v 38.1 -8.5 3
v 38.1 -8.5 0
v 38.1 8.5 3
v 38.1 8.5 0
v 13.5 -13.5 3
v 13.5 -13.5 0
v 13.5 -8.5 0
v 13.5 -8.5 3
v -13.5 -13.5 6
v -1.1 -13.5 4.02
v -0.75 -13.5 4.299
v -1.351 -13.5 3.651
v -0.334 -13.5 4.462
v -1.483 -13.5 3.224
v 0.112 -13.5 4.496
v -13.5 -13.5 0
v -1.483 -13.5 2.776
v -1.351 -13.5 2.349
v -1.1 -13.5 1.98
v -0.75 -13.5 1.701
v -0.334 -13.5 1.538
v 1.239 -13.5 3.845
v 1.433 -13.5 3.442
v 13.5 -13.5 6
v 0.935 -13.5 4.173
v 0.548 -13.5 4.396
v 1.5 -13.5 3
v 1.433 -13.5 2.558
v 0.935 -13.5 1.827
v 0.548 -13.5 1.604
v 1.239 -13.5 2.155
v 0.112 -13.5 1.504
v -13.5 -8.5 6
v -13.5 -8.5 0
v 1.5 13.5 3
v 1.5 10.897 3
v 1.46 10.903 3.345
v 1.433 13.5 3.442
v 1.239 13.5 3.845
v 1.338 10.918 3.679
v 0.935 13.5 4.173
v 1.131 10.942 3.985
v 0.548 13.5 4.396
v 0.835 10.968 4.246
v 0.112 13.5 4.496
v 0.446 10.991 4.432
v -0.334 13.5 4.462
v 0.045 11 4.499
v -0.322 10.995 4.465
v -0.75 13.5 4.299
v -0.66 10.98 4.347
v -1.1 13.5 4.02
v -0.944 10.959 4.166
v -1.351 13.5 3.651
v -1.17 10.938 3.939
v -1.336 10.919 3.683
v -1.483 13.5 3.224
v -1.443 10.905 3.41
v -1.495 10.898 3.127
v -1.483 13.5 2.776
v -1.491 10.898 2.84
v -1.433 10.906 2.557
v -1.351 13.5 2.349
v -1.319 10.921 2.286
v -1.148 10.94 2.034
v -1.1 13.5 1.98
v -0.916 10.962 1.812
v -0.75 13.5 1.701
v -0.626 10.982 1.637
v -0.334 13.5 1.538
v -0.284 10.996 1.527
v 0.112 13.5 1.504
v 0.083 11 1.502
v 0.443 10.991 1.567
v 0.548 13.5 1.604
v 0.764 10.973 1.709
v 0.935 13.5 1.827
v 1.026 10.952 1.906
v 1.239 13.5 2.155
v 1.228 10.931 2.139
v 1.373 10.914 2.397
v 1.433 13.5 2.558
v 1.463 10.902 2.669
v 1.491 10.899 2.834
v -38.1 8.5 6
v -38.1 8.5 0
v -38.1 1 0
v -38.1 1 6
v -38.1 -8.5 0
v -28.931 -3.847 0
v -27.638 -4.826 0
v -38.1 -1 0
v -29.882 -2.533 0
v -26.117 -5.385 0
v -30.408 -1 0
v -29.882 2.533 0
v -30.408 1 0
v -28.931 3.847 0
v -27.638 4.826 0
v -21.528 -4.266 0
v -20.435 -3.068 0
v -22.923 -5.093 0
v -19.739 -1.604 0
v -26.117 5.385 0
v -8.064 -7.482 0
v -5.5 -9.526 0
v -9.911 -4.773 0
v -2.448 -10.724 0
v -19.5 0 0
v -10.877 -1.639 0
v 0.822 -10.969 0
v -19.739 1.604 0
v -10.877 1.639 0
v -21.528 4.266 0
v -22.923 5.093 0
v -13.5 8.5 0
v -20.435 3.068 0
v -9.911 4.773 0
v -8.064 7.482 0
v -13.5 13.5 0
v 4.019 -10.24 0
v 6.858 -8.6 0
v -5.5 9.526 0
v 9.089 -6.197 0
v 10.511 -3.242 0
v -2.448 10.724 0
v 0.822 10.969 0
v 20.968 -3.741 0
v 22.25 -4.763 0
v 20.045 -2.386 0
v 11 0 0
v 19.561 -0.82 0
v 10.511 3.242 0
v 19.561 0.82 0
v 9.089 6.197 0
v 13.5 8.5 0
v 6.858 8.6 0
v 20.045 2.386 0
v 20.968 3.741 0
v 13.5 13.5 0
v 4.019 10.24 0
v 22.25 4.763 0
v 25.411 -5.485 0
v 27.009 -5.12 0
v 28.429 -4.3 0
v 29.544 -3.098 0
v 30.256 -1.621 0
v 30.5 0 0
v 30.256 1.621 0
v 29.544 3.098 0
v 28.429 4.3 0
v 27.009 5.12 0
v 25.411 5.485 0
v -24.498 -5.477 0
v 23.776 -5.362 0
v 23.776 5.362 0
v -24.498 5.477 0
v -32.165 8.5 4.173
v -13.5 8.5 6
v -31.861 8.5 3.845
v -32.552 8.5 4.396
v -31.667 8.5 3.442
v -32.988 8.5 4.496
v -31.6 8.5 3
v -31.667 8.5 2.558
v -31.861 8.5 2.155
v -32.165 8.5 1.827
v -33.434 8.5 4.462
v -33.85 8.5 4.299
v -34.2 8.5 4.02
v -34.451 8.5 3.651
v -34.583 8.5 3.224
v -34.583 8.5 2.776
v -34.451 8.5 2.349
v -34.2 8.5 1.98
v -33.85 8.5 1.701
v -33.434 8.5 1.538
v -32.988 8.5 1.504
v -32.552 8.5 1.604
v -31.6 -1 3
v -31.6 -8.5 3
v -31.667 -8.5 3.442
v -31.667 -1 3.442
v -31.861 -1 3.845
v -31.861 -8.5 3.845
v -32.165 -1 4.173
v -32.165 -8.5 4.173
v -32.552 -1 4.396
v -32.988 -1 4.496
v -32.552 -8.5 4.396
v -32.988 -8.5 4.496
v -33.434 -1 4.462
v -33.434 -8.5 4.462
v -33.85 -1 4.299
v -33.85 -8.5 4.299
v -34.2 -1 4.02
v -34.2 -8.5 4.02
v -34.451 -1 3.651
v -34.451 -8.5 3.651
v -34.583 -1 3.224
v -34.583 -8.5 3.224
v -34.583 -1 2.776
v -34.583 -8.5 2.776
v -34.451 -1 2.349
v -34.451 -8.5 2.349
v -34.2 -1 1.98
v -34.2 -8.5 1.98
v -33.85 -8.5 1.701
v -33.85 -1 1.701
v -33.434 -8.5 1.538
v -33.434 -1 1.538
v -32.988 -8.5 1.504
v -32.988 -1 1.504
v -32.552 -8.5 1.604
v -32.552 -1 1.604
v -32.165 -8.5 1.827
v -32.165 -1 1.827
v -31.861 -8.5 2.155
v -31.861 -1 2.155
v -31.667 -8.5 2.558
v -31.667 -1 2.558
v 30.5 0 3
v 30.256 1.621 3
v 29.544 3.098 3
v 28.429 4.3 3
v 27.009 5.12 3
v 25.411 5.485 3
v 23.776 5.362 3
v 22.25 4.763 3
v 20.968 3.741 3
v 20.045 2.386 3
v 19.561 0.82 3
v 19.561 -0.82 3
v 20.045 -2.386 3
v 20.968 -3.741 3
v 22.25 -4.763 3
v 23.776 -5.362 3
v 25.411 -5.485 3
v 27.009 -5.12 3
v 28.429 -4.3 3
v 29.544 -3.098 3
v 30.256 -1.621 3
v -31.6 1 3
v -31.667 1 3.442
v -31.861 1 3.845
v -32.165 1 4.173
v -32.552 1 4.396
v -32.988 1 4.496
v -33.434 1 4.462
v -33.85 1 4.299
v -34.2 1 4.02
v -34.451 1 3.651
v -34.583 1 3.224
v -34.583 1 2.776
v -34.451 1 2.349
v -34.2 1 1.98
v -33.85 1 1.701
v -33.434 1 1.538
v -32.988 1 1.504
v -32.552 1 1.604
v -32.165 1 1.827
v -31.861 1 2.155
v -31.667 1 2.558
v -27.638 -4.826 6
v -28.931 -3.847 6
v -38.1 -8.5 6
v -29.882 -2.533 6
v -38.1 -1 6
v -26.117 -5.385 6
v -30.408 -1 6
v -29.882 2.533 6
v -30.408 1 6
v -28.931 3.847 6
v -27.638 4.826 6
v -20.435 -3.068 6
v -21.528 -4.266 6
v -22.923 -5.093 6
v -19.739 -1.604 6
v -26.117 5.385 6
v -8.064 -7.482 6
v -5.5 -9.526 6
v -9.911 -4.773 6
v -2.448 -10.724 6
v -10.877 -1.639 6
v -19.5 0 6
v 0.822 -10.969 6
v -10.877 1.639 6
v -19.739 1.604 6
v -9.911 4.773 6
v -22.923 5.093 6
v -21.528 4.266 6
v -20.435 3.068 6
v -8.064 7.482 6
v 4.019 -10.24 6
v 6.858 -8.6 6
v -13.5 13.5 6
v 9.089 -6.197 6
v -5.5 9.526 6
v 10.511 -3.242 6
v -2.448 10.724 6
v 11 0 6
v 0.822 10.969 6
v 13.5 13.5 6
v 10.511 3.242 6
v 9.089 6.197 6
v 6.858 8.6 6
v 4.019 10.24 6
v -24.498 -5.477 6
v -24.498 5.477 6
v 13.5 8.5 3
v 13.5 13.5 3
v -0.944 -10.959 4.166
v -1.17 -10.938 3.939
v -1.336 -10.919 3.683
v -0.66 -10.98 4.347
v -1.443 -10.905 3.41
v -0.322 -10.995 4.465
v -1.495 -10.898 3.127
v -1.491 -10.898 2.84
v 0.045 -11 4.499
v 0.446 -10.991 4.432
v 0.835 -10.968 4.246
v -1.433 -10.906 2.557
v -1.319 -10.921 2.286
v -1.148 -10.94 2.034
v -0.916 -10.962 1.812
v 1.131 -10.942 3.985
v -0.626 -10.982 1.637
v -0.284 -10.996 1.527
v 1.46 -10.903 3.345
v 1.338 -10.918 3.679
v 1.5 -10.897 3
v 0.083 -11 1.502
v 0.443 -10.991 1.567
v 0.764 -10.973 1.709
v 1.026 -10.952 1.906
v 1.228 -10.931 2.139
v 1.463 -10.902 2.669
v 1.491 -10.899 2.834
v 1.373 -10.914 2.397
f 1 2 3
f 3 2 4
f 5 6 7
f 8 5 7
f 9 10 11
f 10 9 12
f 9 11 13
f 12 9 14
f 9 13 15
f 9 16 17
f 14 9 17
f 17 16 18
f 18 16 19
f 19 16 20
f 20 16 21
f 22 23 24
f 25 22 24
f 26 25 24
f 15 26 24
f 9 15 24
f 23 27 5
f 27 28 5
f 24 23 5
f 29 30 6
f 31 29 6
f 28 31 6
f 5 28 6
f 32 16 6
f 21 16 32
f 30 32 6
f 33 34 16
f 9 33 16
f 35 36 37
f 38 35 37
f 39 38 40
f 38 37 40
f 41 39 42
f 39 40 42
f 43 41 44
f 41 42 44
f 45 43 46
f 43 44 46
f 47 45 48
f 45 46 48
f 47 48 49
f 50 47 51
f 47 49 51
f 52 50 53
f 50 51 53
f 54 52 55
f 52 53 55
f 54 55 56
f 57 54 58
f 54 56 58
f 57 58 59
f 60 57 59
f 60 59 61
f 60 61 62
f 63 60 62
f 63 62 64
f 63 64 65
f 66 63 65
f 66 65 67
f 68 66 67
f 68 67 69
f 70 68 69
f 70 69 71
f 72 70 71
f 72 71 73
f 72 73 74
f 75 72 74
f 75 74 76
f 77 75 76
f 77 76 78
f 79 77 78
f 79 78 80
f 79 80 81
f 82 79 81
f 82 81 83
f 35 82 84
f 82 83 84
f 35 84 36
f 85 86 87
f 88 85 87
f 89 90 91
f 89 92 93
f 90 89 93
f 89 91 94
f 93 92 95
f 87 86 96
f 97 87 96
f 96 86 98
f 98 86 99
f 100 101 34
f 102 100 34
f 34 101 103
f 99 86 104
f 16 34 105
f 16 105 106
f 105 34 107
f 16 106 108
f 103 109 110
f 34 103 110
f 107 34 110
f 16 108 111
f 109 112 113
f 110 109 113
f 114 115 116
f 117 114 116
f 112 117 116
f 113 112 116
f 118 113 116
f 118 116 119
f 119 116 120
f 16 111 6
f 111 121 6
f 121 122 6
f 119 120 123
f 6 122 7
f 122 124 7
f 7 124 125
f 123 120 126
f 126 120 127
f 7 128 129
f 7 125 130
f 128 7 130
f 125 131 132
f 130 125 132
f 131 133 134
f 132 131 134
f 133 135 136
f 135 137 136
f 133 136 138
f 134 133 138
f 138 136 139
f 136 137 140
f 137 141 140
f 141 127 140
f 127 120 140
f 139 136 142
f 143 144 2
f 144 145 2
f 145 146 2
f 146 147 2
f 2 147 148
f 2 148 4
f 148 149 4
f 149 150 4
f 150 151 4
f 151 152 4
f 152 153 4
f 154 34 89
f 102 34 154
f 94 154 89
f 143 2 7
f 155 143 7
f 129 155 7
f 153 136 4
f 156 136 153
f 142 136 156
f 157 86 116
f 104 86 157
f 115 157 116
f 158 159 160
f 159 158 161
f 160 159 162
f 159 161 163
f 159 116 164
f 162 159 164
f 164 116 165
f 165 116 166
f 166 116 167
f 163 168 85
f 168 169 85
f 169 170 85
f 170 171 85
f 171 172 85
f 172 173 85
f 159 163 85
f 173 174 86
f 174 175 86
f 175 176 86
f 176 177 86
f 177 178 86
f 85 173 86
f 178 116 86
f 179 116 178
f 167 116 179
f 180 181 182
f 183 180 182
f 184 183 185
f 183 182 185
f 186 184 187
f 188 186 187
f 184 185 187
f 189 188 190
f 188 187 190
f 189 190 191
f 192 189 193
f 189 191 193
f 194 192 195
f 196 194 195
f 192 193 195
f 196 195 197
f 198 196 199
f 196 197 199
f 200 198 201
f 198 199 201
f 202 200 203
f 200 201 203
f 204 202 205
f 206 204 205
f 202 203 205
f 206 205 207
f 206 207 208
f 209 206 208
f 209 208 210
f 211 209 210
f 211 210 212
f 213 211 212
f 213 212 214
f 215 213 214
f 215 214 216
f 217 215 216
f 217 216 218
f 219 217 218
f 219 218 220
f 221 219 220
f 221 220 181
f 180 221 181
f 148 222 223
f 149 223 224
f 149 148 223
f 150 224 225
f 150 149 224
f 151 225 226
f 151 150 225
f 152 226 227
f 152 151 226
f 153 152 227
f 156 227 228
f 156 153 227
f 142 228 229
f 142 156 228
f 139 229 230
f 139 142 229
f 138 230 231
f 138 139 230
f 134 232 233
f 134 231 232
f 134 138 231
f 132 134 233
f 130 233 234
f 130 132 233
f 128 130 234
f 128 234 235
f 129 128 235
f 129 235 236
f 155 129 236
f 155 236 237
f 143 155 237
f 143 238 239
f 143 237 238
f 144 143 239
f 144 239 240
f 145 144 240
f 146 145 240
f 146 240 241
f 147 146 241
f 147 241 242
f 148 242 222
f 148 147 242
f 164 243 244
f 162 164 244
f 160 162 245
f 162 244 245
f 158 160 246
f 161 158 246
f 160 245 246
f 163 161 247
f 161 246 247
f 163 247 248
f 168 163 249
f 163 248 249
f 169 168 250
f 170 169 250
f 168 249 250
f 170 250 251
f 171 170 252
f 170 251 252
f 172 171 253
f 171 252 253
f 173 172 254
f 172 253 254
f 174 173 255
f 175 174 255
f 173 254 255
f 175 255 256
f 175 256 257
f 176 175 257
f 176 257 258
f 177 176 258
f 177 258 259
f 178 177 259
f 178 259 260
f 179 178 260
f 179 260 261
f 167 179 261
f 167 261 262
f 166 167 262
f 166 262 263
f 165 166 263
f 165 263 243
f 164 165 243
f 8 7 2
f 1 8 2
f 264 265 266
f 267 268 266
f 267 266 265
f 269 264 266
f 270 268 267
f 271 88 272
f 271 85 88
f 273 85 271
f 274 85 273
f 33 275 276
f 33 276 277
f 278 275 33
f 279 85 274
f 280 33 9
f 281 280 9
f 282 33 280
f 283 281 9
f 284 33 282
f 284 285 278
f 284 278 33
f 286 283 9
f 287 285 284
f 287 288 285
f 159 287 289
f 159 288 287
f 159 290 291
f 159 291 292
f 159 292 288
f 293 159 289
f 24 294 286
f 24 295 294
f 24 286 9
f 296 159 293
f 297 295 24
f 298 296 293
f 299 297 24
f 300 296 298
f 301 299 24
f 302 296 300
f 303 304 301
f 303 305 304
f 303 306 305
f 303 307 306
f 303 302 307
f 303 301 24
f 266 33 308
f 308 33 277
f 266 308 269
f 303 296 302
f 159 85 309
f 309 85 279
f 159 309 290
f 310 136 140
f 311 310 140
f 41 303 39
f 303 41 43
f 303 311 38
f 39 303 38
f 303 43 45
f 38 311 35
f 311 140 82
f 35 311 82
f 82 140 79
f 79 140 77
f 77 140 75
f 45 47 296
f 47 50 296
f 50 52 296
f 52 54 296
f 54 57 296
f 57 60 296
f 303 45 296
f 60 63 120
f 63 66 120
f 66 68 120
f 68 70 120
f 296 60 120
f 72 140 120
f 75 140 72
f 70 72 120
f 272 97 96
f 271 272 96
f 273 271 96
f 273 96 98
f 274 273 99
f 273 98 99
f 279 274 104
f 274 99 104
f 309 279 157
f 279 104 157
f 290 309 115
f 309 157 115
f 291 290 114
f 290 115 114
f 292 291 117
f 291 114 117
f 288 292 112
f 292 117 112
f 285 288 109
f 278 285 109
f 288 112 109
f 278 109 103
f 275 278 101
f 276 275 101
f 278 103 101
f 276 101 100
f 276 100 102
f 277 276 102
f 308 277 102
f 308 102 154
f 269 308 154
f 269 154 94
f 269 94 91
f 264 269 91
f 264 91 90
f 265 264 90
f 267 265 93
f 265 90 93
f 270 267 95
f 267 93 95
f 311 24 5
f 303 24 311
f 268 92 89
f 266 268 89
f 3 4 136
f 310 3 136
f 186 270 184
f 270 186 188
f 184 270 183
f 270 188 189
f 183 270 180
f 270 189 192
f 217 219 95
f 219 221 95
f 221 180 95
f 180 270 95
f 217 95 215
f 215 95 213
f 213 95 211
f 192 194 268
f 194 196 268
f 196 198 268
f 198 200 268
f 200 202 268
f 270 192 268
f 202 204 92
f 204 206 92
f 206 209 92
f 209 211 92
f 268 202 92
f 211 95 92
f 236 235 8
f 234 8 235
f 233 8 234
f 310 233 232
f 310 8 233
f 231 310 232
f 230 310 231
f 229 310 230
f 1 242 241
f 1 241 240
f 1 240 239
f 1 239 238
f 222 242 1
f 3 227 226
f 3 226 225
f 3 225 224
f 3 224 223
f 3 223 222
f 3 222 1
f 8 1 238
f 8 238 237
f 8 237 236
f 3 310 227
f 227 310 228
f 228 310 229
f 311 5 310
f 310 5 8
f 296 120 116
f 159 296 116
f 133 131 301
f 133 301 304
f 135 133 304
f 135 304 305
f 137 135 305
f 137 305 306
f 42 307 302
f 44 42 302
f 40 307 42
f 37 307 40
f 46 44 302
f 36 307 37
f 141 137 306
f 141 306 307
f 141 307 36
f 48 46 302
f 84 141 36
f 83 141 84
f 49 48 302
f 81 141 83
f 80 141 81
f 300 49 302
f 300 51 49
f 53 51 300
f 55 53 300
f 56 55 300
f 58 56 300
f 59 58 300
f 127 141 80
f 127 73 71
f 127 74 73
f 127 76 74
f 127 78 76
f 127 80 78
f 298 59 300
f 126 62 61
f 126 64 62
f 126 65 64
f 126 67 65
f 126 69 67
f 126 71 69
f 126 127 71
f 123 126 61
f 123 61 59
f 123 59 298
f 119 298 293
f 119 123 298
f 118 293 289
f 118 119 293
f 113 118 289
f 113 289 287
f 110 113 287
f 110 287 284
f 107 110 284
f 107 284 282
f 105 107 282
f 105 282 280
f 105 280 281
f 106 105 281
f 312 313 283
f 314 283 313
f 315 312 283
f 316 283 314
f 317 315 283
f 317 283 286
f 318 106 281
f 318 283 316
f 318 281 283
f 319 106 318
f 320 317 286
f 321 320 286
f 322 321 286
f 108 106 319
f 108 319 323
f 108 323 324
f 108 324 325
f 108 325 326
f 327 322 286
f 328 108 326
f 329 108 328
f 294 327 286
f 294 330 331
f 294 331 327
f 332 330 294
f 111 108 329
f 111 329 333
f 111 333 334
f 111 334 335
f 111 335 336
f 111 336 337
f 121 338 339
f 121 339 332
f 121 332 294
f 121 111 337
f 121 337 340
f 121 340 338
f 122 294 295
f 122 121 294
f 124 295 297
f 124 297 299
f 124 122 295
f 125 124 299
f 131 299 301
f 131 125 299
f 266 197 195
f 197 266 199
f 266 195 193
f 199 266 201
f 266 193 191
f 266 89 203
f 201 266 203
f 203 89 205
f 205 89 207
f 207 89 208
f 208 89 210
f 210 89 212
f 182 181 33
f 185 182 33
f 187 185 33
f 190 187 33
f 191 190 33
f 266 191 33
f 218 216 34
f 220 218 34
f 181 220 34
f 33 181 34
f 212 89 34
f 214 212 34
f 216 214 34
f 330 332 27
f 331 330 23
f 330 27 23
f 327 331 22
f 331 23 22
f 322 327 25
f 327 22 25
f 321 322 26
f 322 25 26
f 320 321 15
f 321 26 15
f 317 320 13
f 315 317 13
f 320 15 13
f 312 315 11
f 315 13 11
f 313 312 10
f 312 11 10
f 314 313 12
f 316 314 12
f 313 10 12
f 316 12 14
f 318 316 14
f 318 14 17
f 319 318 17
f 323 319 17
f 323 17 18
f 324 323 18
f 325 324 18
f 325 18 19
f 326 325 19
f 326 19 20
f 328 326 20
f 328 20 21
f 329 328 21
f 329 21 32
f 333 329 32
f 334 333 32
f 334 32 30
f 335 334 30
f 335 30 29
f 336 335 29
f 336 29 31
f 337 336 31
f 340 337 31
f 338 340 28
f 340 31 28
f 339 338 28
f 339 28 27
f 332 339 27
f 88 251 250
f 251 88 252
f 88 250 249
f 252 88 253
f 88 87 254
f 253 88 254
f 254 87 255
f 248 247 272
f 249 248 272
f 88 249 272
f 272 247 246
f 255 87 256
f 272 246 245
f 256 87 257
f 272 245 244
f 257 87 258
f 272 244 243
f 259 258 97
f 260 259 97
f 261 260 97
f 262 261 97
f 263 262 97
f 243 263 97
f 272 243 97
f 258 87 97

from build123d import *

# Parameters (mm, degrees)
F0_R     = 11
F0_R_2   = 5.5
F1_DEPTH = 6
F2_R     = 1.5
F3_DEPTH = 50.8
F4_W     = 54.249955
F4_H     = 32.60367
F5_DEPTH = 3


with BuildPart() as f1:
    # F0 (on Top) → F1 (new body)
    with BuildSketch(Plane.XY):
        with BuildLine():
            ThreePointArc((-30.408327, 1), (-19.5, 0), (-30.408327, -1))
            Line((-30.408327, -1), (-38.1, -1))
            Line((-38.1, -1), (-38.1, -8.5))
            Line((-38.1, -8.5), (-13.5, -8.5))
            Line((-13.5, -8.5), (-13.5, -13.5))
            Line((-13.5, -13.5), (13.5, -13.5))
            Line((13.5, -13.5), (13.5, -8.5))
            Line((13.5, -8.5), (38.1, -8.5))
            Line((38.1, -8.5), (38.1, 8.5))
            Line((38.1, 8.5), (13.5, 8.5))
            Line((13.5, 8.5), (13.5, 13.5))
            Line((13.5, 13.5), (-13.5, 13.5))
            Line((-13.5, 13.5), (-13.5, 8.5))
            Line((-13.5, 8.5), (-38.1, 8.5))
            Line((-38.1, 8.5), (-38.1, 1))
            Line((-38.1, 1), (-30.408327, 1))
        make_face()
        Circle(F0_R, mode=Mode.SUBTRACT)
        with Locations((25, 0)):
            Circle(F0_R_2, mode=Mode.SUBTRACT)
    extrude(amount=F1_DEPTH)

    # F2 (on face) → F3 (cut)
    with BuildSketch(Plane.XZ.offset(13.5)):
        with Locations((0, 3)):
            Circle(F2_R)
        with Locations((-33.1, 3)):
            Circle(F2_R)
    extrude(amount=-F3_DEPTH, mode=Mode.SUBTRACT)

    # F4 (on face) → F5 (cut)
    with BuildSketch(Plane.XY.offset(6)):
        with Locations((40.624977, -2.801835)):
            Rectangle(F4_W, F4_H)
    extrude(amount=-F5_DEPTH, mode=Mode.SUBTRACT)


solid = f1.part
